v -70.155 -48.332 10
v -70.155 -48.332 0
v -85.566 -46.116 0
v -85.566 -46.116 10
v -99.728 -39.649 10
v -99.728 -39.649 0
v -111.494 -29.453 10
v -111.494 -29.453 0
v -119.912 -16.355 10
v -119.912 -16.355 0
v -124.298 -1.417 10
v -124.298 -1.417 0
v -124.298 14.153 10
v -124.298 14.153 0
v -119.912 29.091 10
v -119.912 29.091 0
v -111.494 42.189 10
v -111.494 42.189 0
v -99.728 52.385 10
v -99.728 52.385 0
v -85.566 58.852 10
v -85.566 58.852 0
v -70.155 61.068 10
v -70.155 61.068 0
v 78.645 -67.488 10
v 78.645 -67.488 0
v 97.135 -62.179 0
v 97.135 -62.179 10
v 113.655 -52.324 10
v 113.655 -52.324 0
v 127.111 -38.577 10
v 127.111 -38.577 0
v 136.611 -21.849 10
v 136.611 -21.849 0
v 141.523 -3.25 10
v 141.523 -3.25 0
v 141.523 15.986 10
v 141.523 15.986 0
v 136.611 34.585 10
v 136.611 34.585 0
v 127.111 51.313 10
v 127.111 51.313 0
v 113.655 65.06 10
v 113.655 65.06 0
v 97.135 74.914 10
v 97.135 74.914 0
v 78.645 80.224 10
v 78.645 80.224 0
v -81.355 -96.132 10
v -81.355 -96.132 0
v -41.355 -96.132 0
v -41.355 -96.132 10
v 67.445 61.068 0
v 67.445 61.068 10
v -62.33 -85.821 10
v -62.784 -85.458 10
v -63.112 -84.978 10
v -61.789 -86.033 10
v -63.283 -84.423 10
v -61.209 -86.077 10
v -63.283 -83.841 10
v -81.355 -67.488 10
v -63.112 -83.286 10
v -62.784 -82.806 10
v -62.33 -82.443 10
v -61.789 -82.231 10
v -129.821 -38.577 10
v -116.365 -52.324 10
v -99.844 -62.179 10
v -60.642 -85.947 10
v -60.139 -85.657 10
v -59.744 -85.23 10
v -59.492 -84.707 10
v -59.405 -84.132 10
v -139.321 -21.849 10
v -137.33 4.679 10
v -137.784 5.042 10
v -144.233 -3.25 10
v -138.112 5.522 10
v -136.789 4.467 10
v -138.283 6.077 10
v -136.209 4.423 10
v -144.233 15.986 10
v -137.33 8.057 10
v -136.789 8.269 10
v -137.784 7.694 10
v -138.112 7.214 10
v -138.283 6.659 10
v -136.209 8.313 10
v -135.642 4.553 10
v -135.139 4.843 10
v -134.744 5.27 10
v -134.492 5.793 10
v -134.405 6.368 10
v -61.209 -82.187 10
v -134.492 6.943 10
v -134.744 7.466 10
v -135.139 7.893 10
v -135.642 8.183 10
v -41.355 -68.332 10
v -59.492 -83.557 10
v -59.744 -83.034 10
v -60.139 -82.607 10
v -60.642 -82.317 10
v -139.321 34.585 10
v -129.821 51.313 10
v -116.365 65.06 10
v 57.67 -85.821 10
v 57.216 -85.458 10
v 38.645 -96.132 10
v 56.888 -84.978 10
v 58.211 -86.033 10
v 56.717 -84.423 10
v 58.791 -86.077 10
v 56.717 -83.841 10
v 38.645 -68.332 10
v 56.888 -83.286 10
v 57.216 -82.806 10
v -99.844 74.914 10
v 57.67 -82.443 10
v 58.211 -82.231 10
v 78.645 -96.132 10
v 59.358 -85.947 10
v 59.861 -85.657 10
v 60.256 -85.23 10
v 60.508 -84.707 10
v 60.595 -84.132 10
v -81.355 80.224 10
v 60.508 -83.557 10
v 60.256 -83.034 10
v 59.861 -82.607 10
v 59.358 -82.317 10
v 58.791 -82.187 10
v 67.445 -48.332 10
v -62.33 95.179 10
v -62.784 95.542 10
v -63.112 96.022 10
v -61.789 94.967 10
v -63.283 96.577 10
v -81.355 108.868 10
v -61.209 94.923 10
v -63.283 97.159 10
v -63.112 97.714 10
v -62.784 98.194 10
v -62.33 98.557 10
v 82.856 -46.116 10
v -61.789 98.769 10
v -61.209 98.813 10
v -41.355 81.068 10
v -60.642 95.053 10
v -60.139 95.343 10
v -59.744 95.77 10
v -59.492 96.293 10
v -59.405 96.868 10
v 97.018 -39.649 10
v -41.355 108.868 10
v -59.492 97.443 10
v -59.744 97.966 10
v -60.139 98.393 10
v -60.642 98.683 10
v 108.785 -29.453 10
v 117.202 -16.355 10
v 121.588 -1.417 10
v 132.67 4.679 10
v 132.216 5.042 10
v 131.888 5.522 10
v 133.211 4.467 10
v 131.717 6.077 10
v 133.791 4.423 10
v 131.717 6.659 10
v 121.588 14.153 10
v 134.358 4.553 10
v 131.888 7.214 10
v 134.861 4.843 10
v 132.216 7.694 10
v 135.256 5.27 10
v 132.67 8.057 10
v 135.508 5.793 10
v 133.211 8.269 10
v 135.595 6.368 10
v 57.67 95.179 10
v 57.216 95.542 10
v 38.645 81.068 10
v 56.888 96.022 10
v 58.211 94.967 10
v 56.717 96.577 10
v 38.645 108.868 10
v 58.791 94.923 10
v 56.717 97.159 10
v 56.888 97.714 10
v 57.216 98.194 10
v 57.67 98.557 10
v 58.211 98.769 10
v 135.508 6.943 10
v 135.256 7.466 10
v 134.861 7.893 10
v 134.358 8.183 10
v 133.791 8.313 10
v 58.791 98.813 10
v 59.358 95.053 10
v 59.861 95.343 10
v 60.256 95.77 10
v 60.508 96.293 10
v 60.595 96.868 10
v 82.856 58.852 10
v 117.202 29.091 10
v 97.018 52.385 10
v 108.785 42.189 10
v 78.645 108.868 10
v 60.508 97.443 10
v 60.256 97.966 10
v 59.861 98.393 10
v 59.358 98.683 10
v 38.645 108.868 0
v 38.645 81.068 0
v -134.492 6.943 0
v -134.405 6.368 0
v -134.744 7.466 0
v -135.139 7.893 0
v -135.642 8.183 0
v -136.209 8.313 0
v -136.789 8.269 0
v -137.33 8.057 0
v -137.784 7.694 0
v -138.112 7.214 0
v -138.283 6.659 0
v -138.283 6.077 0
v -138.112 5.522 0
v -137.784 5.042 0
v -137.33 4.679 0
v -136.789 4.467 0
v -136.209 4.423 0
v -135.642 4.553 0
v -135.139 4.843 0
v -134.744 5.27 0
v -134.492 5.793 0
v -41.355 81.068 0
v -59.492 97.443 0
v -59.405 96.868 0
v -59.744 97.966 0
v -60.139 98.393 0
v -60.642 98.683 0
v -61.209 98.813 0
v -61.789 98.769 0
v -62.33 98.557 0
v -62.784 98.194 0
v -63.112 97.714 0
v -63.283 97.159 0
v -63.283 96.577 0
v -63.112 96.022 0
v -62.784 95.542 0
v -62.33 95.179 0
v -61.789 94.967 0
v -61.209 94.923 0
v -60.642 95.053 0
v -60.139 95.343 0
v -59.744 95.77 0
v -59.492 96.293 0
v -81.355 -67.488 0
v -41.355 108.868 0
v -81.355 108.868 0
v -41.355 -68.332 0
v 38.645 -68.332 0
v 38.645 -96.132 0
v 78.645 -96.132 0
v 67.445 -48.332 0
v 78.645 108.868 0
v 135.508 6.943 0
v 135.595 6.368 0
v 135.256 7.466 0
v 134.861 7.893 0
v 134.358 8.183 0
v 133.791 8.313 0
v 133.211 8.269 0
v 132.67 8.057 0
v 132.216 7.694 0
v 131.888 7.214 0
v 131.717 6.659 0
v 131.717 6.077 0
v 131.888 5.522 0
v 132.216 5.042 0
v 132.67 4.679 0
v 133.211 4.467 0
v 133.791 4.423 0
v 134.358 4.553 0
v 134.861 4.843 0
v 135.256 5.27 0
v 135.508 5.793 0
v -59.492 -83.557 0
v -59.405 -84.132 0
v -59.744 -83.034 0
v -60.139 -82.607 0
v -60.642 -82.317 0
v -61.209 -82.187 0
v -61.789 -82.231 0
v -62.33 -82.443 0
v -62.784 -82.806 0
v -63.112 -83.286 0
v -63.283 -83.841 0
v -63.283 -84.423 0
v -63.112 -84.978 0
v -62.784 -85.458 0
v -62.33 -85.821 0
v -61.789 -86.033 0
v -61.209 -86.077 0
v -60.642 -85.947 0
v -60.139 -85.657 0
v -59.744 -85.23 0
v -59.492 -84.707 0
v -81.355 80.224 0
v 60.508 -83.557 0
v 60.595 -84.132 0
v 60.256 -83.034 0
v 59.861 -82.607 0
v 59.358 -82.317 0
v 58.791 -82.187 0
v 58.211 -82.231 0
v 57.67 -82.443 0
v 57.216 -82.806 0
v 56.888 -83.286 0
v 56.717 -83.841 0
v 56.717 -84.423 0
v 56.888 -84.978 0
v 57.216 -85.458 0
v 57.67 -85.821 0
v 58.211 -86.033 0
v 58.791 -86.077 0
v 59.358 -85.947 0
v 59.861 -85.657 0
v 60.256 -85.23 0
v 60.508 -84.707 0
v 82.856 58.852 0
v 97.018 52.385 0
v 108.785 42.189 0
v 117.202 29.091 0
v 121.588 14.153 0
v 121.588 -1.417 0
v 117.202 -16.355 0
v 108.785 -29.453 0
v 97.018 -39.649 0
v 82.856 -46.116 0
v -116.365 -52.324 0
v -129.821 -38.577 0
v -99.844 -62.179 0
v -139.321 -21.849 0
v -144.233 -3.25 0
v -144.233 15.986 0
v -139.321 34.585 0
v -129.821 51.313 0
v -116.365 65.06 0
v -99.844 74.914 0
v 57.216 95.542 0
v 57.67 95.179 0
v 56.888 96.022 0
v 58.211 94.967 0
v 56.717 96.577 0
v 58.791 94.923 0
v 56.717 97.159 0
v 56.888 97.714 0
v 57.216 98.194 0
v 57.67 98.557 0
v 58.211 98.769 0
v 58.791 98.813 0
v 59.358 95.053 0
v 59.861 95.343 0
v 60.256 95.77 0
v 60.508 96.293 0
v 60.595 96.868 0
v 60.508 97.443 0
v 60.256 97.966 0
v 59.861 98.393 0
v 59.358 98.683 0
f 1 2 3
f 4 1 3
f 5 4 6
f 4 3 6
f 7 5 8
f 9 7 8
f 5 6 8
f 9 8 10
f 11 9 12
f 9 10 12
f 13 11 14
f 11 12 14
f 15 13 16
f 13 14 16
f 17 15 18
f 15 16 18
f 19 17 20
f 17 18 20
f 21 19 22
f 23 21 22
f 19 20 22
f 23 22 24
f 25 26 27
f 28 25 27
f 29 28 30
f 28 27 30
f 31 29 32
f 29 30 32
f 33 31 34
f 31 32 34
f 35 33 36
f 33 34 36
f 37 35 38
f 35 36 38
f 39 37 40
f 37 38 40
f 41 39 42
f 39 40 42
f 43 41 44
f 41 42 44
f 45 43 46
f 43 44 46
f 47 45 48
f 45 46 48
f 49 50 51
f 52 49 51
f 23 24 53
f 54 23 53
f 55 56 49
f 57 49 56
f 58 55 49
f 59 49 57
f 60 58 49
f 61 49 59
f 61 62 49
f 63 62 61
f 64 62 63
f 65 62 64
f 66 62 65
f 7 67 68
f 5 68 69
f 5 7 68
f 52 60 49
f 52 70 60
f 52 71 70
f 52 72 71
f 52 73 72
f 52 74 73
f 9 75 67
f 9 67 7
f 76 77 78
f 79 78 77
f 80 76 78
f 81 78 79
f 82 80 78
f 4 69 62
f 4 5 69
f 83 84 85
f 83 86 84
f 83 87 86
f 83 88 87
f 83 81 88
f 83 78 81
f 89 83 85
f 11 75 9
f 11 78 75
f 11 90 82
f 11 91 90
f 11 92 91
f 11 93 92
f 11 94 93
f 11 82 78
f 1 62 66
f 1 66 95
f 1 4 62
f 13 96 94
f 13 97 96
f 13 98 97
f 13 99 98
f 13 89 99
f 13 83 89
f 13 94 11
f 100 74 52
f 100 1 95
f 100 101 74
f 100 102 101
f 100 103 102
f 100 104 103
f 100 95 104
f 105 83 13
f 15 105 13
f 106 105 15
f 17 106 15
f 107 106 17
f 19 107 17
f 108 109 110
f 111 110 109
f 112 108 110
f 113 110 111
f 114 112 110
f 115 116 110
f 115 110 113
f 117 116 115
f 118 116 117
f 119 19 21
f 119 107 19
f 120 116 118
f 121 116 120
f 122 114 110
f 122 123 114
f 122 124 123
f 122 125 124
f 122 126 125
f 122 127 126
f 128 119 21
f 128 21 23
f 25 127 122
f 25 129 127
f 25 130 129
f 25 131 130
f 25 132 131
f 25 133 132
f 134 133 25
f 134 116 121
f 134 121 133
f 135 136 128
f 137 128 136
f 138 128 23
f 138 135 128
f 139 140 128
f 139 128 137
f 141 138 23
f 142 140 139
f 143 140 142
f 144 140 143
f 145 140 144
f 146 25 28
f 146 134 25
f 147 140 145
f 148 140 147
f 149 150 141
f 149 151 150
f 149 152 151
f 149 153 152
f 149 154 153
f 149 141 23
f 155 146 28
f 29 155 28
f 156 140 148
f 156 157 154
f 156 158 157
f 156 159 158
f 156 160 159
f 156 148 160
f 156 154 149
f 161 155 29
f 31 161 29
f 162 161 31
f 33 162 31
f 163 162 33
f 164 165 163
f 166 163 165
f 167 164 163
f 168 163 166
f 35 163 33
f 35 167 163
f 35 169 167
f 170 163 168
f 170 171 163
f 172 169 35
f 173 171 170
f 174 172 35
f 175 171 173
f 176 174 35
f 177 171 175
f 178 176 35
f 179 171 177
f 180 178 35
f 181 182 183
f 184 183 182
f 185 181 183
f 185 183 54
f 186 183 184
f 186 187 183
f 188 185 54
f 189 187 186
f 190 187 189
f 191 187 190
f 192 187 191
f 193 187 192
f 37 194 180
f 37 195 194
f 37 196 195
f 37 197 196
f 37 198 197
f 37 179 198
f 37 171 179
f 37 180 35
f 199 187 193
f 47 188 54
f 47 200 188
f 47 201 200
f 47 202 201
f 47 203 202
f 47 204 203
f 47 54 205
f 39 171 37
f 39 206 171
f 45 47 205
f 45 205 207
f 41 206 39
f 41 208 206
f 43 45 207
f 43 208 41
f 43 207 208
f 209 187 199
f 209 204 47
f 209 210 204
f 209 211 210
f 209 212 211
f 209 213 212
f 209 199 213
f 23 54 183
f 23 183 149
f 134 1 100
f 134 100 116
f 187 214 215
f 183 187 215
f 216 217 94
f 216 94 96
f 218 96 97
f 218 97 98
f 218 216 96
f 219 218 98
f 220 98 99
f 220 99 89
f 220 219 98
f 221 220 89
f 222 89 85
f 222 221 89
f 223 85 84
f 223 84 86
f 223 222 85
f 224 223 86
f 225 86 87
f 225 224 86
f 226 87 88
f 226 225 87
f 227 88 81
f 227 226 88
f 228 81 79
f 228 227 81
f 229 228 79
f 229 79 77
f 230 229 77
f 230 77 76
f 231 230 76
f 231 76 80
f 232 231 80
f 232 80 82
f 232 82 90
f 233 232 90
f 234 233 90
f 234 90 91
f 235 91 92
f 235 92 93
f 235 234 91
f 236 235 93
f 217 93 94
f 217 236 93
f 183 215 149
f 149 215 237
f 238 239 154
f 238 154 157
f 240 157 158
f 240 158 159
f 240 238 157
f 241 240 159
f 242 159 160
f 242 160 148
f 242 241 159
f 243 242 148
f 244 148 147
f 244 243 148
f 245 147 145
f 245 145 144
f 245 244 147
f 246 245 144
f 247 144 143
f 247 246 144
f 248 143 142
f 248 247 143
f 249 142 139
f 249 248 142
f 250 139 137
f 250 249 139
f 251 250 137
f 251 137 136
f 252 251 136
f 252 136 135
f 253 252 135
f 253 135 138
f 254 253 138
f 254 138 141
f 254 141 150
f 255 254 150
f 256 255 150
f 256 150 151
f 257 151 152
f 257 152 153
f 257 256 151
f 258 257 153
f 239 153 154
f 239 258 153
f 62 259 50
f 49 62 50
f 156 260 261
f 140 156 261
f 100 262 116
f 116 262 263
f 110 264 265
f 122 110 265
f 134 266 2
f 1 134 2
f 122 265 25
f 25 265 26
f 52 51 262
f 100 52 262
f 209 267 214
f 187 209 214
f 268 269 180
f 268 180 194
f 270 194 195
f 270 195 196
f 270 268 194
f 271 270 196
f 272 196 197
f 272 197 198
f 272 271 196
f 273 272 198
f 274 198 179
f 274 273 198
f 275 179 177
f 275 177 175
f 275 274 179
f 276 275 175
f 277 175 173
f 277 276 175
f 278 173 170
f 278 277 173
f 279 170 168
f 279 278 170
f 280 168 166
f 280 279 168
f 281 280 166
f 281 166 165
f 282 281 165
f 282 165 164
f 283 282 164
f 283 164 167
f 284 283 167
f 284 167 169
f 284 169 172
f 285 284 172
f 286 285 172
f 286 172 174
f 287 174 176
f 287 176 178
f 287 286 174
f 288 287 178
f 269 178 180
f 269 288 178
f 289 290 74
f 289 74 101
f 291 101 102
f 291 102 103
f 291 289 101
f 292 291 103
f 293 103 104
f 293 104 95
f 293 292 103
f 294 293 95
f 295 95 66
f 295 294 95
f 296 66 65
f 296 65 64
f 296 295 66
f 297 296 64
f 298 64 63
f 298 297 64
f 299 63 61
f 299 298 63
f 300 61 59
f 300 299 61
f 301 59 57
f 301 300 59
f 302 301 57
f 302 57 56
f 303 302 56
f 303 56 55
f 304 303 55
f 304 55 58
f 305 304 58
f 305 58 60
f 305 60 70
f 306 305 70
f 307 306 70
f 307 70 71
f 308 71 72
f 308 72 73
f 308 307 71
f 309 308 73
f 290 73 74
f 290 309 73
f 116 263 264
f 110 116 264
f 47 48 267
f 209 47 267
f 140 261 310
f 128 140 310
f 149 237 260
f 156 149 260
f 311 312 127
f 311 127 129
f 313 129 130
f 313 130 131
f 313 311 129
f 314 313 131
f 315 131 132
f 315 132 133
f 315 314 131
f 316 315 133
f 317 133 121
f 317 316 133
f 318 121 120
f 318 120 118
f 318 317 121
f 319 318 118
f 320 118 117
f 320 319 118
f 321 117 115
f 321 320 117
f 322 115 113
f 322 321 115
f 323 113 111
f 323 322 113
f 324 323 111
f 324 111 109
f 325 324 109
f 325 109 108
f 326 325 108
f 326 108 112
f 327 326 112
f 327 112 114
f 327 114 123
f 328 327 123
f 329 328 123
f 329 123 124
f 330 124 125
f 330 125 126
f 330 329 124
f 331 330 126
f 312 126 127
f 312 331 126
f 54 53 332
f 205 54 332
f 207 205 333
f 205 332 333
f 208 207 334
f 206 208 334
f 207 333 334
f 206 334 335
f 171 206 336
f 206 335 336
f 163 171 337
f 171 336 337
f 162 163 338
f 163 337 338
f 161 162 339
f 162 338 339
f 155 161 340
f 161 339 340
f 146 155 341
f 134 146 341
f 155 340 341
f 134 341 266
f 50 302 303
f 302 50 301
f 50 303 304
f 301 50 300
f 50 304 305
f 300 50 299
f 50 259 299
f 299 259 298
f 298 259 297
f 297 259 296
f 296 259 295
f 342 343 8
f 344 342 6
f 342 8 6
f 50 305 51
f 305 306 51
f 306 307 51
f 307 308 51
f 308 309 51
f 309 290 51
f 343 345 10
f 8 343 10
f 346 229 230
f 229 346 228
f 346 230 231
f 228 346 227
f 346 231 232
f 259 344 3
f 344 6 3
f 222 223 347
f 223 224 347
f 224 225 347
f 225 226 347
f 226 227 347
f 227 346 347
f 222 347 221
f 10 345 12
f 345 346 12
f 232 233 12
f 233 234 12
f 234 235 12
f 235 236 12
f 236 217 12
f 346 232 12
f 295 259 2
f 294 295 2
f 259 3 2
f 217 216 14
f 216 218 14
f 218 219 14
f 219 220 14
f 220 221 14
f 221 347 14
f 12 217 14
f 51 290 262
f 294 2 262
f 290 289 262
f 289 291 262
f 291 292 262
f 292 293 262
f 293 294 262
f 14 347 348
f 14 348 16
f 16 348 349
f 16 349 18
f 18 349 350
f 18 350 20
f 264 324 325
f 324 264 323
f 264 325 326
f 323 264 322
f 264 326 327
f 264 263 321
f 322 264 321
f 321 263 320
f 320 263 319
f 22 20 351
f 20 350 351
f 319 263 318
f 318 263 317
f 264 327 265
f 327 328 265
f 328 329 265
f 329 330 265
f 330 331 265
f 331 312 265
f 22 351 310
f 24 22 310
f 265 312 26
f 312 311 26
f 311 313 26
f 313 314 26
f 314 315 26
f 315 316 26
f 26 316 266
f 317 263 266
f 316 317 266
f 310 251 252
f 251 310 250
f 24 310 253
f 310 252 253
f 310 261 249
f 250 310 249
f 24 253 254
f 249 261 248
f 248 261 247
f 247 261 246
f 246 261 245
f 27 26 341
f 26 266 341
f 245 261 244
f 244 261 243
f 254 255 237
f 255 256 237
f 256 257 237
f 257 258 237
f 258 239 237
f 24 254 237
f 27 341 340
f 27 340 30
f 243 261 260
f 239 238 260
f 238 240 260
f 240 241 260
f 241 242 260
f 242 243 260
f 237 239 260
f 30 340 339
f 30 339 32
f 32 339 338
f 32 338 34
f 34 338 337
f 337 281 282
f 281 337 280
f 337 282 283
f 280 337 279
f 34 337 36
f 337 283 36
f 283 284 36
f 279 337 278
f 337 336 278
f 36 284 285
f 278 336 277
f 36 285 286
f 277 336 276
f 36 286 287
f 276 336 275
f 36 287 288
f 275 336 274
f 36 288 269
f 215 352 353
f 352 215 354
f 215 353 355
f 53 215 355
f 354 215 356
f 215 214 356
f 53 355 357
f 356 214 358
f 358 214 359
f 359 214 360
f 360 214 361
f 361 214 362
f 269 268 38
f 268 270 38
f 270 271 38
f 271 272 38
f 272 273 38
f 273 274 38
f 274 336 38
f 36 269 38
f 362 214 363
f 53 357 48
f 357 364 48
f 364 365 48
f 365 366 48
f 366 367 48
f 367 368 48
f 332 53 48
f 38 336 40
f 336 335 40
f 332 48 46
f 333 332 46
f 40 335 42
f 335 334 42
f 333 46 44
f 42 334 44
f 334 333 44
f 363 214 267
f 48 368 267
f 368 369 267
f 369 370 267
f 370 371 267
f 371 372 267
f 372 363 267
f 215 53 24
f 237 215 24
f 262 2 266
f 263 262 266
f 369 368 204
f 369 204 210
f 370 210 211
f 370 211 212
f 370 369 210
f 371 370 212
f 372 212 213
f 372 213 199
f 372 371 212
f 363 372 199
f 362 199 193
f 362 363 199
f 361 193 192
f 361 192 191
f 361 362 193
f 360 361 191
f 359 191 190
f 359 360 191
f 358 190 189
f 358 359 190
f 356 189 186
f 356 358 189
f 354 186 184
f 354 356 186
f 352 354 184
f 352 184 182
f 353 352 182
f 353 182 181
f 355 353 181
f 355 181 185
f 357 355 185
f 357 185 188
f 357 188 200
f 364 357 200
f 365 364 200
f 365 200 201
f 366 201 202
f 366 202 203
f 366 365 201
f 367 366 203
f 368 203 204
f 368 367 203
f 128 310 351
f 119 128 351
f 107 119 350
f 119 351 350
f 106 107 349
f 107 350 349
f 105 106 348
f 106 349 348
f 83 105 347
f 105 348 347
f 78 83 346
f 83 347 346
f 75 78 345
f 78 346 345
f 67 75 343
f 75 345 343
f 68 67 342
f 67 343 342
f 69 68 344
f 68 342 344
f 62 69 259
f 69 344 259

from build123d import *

# Parameters (mm, degrees)
SKETCH1_R           = 1.95
BOSS_EXTRUDE1_DEPTH = 10


with BuildPart() as part:
    # Sketch1 → Boss-Extrude1 (new body)
    with BuildSketch(Plane.XY):
        with BuildLine():
            ThreePointArc((-81.354892482, 80.223597026), (-144.854892482, 6.367994666), (-81.354892482, -67.487607695))
            Line((-81.354892482, -67.487607695), (-81.354892482, -96.132005334))
            Line((-81.354892482, -96.132005334), (-41.354892482, -96.132005334))
            Line((-41.354892482, -96.132005334), (-41.354892482, -68.332005334))
            Line((-41.354892482, -68.332005334), (38.645107518, -68.332005334))
            Line((38.645107518, -68.332005334), (38.645107518, -96.132005334))
            Line((38.645107518, -96.132005334), (78.645107518, -96.132005334))
            Line((78.645107518, -96.132005334), (78.645107518, -67.487607695))
            ThreePointArc((78.645107518, -67.487607695), (142.145107518, 6.367994666), (78.645107518, 80.223597026))
            Line((78.645107518, 80.223597026), (78.645107518, 108.867994666))
            Line((78.645107518, 108.867994666), (38.645107518, 108.867994666))
            Line((38.645107518, 108.867994666), (38.645107518, 81.067994666))
            Line((38.645107518, 81.067994666), (-41.354892482, 81.067994666))
            Line((-41.354892482, 81.067994666), (-41.354892482, 108.867994666))
            Line((-41.354892482, 108.867994666), (-81.354892482, 108.867994666))
            Line((-81.354892482, 108.867994666), (-81.354892482, 80.223597026))
        make_face()
        with Locations((-136.354892482, 6.367994666)):
            Circle(SKETCH1_R, mode=Mode.SUBTRACT)
        with Locations((133.645107518, 6.367994666)):
            Circle(SKETCH1_R, mode=Mode.SUBTRACT)
        with BuildLine():
            Line((-70.154892482, 61.067994666), (67.445107518, 61.067994666))
            ThreePointArc((67.445107518, 61.067994666), (122.145107518, 6.367994666), (67.445107518, -48.332005334))
            Line((67.445107518, -48.332005334), (-70.154892482, -48.332005334))
            ThreePointArc((-70.154892482, -48.332005334), (-124.854892482, 6.367994666), (-70.154892482, 61.067994666))
        make_face(mode=Mode.SUBTRACT)
        with Locations((-61.354892482, 96.867994666)):
            Circle(SKETCH1_R, mode=Mode.SUBTRACT)
        with Locations((58.645107518, 96.867994666)):
            Circle(SKETCH1_R, mode=Mode.SUBTRACT)
        with Locations((-61.354892482, -84.132005334)):
            Circle(SKETCH1_R, mode=Mode.SUBTRACT)
        with Locations((58.645107518, -84.132005334)):
            Circle(SKETCH1_R, mode=Mode.SUBTRACT)
    extrude(amount=BOSS_EXTRUDE1_DEPTH)


solid = part.part
